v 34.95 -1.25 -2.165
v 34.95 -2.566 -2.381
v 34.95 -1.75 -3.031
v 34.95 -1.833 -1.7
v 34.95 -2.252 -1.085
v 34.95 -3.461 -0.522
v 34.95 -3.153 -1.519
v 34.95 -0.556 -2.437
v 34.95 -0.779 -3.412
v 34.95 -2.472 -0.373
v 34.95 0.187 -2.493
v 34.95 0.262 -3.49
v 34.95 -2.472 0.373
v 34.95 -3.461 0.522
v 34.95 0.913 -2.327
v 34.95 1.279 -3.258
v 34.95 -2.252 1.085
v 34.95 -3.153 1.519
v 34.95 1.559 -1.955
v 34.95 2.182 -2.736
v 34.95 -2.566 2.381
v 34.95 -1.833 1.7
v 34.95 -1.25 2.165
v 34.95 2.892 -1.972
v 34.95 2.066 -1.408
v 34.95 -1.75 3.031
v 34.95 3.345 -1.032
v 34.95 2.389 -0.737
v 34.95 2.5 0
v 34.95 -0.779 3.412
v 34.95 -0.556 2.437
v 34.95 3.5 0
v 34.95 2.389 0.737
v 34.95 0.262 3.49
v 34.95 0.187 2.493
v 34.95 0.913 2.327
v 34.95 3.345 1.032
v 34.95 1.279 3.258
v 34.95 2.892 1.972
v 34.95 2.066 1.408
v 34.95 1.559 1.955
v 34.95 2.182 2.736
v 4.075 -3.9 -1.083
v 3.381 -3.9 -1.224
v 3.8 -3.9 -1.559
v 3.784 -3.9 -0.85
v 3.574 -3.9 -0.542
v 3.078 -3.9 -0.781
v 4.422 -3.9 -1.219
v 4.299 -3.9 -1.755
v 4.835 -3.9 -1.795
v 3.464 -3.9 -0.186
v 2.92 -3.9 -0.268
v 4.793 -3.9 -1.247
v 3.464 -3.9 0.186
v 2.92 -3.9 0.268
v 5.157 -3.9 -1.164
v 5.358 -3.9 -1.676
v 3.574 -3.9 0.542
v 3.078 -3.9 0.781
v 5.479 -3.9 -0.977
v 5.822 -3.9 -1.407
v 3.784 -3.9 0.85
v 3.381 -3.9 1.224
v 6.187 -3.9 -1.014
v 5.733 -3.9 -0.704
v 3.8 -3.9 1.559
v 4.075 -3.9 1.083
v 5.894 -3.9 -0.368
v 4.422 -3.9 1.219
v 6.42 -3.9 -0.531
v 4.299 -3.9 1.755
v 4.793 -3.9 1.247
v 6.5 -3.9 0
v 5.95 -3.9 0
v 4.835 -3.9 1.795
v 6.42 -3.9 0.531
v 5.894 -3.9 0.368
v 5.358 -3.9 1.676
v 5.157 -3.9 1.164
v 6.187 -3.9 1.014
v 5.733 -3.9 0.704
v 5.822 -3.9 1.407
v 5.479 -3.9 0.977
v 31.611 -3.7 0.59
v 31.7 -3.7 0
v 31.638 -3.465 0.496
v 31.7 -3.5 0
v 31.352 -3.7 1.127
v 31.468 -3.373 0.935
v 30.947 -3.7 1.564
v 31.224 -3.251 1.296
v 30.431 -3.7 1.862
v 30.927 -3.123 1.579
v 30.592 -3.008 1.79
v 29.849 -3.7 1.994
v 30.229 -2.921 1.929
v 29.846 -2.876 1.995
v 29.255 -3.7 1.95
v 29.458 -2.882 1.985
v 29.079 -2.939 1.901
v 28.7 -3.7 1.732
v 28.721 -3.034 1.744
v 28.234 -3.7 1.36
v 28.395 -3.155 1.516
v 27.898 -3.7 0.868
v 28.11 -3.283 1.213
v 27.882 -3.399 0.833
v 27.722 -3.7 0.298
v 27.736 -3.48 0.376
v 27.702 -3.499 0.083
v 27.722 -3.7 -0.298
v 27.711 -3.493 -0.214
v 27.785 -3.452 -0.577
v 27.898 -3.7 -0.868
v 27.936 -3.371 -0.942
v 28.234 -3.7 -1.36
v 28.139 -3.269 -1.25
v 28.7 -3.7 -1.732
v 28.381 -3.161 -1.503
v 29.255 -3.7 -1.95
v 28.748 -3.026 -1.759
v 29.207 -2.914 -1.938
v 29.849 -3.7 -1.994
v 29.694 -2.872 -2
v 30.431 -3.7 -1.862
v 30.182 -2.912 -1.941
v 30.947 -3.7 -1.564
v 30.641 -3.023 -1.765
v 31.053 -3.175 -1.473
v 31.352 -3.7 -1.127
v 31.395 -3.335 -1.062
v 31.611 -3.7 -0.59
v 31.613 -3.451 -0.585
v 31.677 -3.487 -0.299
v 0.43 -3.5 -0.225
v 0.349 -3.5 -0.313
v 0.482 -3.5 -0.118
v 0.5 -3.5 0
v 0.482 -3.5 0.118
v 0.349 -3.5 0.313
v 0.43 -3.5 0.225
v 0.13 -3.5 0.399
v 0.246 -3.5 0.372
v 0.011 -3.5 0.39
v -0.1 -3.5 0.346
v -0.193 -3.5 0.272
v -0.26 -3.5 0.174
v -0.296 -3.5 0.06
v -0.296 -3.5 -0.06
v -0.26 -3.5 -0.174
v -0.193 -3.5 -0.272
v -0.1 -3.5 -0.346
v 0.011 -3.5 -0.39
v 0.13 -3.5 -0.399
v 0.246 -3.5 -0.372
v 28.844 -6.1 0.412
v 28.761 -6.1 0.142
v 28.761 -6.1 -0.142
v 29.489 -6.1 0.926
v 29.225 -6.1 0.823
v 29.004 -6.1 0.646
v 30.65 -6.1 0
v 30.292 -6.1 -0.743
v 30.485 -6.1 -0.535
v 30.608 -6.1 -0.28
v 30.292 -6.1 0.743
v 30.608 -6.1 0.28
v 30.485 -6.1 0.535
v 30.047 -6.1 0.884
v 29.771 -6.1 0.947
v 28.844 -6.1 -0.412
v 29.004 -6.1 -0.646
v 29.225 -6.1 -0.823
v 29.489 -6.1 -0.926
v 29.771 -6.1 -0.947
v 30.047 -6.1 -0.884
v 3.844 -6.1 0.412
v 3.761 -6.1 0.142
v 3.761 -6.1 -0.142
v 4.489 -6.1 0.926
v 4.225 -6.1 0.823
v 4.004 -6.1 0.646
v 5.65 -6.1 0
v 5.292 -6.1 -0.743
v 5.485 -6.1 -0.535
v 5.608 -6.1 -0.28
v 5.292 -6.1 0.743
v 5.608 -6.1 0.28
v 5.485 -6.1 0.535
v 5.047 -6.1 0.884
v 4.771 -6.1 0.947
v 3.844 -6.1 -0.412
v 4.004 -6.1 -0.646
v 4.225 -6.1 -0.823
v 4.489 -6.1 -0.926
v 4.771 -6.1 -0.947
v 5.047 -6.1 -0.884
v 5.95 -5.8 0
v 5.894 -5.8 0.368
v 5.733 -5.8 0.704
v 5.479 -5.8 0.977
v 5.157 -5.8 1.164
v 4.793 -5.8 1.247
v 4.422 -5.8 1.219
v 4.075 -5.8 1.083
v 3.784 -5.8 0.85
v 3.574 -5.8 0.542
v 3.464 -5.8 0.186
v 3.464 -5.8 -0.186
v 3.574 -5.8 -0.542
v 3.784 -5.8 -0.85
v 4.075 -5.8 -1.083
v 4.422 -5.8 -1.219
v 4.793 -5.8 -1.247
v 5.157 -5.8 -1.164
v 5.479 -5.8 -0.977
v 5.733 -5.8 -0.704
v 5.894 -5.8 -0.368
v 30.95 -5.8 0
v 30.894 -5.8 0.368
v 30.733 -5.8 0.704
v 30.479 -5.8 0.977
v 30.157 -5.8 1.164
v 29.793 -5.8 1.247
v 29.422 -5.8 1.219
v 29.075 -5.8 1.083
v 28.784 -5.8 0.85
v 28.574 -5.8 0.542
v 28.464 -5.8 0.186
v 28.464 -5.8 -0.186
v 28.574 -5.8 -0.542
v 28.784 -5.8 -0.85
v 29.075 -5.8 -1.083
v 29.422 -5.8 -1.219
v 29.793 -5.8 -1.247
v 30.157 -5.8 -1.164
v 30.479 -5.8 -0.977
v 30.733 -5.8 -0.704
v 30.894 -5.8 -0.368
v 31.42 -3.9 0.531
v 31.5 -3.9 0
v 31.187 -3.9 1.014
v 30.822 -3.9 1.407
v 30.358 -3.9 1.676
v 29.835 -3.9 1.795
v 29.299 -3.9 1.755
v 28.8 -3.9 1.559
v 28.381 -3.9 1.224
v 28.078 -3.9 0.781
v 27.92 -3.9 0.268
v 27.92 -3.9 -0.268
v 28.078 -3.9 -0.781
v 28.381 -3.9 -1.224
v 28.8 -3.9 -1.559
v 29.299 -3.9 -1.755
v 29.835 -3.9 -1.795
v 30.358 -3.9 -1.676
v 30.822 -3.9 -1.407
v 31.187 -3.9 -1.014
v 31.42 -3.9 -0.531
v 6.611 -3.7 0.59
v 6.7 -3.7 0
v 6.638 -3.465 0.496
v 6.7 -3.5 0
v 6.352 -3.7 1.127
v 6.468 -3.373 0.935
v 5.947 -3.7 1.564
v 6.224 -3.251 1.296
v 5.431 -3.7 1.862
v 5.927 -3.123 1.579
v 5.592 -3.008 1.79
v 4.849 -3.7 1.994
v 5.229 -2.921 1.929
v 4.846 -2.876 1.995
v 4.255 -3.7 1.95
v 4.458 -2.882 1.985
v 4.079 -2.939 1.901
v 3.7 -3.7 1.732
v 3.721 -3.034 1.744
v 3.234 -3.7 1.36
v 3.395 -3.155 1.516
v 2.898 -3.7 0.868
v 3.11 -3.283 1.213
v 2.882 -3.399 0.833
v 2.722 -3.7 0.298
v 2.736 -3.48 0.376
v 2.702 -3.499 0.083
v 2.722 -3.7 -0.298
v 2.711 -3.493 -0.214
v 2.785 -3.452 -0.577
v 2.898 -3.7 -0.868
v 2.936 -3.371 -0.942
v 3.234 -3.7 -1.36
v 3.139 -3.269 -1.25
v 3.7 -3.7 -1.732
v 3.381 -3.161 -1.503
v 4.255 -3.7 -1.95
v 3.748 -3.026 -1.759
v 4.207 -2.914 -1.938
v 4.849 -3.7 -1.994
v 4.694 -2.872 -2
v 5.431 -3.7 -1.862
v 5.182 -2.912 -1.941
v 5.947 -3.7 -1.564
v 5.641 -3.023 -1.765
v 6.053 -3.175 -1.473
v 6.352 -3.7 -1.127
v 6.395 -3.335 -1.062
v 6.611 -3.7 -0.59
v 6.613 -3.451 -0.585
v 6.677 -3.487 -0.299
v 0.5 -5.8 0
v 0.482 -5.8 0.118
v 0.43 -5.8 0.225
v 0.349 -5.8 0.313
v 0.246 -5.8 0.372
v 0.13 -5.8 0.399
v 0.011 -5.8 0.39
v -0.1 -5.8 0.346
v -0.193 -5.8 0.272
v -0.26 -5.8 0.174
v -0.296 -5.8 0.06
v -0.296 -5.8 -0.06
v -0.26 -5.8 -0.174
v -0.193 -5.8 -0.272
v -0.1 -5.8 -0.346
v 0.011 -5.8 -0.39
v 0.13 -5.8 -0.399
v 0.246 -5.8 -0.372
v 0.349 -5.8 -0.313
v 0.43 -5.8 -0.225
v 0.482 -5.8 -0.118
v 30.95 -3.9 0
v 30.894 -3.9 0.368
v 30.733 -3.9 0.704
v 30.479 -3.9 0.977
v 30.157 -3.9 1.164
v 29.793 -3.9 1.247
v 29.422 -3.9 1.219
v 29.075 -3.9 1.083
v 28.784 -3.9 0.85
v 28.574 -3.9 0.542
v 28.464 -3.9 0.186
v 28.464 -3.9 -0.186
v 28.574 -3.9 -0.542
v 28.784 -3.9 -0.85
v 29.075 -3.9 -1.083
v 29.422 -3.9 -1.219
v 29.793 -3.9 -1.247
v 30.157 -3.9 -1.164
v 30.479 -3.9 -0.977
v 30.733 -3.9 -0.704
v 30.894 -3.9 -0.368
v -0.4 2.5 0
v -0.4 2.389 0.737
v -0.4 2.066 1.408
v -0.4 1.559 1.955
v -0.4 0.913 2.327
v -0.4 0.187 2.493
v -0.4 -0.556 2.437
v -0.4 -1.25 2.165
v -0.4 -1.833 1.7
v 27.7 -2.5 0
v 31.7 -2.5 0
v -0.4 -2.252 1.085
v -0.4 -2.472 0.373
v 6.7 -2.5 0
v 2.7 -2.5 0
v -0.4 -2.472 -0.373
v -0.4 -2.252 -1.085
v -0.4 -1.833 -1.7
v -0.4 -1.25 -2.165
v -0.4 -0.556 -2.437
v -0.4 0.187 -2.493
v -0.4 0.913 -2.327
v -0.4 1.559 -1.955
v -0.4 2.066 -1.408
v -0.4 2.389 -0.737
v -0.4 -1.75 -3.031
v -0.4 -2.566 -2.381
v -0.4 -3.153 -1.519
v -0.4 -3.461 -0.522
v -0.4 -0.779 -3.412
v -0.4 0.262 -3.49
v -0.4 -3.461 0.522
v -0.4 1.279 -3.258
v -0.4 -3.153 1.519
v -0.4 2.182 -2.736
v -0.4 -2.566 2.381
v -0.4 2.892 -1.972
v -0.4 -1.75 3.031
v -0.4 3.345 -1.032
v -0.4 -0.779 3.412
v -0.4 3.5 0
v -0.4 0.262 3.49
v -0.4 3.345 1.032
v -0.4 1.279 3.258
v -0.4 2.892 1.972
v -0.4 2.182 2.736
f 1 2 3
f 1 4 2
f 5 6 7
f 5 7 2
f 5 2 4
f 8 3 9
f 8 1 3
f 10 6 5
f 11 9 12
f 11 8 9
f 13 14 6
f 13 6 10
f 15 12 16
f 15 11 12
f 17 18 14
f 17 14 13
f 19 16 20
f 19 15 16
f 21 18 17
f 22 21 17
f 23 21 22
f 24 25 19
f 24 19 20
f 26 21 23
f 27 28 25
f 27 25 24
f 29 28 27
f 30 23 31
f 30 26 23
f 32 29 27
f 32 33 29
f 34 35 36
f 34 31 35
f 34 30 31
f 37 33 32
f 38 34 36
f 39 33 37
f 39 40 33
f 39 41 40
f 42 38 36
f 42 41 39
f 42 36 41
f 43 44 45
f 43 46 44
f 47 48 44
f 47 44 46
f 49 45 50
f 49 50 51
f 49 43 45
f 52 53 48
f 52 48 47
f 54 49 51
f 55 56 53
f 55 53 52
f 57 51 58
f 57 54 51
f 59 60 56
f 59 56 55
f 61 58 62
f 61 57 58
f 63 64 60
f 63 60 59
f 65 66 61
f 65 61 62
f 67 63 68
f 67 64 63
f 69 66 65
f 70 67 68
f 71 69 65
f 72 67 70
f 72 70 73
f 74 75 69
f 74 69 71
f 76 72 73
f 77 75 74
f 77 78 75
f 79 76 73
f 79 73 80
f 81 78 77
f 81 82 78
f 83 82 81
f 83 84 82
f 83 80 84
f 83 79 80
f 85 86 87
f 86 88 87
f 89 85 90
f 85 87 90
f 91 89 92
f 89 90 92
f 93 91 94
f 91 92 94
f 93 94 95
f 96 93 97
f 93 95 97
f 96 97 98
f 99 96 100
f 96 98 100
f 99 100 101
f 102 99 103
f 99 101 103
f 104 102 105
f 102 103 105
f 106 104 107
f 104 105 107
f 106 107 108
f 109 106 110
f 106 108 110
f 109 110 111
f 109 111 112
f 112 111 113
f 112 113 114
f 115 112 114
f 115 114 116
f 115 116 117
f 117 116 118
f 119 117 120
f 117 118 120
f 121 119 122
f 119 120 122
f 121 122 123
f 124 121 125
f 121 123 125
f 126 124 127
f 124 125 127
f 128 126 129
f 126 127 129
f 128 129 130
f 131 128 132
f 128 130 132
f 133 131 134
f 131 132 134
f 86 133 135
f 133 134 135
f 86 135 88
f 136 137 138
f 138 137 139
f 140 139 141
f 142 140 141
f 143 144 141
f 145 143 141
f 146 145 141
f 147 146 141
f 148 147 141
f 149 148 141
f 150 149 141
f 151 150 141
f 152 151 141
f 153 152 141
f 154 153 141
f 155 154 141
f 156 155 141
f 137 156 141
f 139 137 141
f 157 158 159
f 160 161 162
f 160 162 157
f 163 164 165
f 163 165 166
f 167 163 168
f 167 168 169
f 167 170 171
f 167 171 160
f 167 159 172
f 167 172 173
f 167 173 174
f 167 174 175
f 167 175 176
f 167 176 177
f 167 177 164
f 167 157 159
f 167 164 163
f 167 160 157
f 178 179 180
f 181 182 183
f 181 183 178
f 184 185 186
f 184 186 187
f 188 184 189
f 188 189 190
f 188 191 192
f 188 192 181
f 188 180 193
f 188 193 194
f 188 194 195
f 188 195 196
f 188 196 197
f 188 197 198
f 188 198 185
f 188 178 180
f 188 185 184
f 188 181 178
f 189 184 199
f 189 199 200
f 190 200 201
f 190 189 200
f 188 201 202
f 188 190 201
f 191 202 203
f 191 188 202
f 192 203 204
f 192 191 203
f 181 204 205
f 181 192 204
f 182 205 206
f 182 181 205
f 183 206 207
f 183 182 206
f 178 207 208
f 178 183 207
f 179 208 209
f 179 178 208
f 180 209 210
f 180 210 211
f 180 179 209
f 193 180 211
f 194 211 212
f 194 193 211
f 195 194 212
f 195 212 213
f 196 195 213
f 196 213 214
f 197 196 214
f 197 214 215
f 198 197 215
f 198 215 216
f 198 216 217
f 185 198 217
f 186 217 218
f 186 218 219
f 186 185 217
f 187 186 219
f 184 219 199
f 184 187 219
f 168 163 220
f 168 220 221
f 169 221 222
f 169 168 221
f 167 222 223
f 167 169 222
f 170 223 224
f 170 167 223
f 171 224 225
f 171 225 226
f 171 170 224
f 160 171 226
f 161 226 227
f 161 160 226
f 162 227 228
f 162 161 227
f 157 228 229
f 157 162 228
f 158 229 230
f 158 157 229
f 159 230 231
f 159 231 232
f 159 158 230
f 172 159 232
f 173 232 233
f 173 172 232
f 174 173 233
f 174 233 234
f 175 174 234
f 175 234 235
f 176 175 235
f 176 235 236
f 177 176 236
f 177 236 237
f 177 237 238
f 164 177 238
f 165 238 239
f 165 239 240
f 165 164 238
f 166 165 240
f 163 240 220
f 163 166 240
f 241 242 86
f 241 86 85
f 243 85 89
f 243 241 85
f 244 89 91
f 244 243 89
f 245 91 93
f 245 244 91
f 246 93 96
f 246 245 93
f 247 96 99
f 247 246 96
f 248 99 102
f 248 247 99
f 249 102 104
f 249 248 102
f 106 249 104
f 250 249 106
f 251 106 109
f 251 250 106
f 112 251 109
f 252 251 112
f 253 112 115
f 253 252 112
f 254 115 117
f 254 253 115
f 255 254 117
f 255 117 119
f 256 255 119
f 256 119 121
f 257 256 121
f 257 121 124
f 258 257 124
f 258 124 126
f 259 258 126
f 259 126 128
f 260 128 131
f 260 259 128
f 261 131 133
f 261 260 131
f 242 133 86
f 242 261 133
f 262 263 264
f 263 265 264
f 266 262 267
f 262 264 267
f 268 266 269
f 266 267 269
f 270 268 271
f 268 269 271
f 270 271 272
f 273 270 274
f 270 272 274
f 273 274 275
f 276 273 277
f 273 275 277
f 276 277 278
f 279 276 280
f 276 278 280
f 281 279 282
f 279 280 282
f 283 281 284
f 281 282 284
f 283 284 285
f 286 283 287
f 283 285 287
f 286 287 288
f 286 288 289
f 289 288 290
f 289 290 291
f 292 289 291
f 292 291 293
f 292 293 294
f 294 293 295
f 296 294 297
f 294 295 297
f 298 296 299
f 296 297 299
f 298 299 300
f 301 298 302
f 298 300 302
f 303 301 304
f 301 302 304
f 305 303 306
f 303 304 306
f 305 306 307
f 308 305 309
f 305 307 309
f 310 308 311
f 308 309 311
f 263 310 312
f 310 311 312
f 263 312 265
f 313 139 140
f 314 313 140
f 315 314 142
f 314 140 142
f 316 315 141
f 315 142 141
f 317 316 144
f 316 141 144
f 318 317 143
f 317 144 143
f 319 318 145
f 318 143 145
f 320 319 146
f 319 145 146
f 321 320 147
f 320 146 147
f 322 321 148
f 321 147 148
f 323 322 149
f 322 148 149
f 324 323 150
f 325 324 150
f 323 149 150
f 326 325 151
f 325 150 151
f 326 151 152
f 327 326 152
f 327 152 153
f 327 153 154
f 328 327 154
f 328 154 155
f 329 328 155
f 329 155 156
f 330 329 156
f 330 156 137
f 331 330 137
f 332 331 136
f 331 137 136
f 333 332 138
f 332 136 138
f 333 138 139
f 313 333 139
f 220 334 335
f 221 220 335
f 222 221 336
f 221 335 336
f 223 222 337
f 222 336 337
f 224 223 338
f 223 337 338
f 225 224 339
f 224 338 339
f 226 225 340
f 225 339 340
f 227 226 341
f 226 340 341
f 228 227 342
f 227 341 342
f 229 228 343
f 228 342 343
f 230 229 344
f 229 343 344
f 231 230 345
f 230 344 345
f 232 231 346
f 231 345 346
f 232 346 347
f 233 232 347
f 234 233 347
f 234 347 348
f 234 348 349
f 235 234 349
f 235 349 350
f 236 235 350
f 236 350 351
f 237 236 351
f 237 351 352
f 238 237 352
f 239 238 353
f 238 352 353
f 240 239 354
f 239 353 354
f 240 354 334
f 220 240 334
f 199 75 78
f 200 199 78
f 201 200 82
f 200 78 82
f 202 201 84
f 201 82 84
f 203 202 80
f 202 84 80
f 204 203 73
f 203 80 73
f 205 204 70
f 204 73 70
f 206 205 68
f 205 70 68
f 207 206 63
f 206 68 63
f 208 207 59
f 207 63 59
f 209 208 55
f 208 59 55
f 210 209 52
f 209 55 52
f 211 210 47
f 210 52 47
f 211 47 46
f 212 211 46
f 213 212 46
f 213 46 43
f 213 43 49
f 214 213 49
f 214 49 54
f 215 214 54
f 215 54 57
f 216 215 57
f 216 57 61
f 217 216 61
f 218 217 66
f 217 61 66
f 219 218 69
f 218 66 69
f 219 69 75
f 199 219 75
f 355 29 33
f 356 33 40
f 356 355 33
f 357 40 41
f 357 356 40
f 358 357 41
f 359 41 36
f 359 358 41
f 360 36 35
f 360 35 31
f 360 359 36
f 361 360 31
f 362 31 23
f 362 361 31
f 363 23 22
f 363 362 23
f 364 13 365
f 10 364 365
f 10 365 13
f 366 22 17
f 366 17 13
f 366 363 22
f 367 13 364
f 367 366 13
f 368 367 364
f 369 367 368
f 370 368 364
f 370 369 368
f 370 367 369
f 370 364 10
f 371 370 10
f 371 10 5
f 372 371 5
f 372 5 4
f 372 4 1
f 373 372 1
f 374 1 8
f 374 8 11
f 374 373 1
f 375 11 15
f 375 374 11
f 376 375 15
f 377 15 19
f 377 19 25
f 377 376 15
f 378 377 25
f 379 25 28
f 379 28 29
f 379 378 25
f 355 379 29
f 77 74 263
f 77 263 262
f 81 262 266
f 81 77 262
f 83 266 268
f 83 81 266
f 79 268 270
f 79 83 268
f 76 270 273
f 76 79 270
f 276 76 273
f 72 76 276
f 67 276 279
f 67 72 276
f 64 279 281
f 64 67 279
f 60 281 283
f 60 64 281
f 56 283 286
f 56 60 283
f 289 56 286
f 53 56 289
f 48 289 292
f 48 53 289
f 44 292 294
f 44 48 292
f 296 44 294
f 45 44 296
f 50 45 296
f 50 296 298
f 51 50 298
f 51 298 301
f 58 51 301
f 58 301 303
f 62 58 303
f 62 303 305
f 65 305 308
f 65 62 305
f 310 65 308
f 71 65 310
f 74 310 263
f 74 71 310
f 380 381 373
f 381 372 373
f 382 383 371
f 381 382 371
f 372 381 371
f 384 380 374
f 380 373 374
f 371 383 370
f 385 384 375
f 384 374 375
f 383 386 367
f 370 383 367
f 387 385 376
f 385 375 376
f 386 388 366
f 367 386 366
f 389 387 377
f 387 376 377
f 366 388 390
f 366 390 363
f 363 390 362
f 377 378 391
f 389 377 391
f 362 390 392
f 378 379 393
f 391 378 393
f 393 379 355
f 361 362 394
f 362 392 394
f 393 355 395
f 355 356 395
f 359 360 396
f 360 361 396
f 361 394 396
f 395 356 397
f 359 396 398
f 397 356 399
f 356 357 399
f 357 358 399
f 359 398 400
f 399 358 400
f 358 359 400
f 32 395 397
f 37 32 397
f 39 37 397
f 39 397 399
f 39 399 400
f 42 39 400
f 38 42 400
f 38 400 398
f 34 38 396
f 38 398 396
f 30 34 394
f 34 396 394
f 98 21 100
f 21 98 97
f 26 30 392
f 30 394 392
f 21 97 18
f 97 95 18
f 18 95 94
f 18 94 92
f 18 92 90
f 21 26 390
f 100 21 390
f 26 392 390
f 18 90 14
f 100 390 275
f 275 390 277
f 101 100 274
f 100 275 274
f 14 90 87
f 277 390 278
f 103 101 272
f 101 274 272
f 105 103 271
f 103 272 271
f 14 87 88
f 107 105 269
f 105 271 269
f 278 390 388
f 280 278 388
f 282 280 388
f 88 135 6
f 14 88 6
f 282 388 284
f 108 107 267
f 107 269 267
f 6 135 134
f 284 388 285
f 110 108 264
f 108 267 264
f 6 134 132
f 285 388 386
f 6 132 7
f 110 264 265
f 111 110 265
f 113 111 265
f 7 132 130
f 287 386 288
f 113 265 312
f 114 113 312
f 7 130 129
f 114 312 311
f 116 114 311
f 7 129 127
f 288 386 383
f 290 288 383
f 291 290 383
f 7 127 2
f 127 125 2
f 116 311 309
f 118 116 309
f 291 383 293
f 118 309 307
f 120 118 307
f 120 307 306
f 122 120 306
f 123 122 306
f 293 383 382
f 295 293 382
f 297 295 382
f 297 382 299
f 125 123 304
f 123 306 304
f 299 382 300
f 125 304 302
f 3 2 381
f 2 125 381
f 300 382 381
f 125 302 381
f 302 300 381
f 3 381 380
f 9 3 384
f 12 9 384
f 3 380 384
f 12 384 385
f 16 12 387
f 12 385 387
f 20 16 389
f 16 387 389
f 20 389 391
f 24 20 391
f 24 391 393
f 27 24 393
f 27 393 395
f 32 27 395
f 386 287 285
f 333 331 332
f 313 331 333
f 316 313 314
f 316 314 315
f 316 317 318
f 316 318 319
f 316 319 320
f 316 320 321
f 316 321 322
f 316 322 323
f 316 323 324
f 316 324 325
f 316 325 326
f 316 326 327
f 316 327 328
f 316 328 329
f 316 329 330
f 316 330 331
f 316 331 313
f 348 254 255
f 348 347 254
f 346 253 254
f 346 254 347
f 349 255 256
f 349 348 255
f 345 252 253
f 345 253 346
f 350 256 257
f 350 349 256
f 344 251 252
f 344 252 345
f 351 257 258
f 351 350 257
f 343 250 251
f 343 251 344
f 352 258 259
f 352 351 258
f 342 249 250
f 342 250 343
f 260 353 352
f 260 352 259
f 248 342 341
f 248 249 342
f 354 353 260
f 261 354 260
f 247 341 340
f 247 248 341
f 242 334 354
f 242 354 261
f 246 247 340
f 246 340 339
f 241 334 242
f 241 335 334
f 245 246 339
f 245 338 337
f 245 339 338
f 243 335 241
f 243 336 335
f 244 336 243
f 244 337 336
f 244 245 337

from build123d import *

# Parameters (mm, degrees)
F0_R           = 3.5
F0_R_2         = 2.5
F1_DEPTH       = 34.55
F6_DEPTH       = 0.4
F7_DEPTH       = 0.4
F9_R           = 2
F10_DEPTH      = 0.4
F10_DEPTH_BACK = 1
F11_R          = 1.25
F12_DEPTH      = 2.2
F13_SIZE       = 0.2
F14_SIZE       = 0.3
F5_R           = 0.4
F15_DEPTH      = 2.3


with BuildPart() as f1:
    # F0 (on Right) → F1 (new body)
    with BuildSketch(Plane.YZ):
        Circle(F0_R)
        Circle(F0_R_2, mode=Mode.SUBTRACT)
    extrude(amount=F1_DEPTH)

    # F6 (add): a face of the model
    f6_faces = [f1.faces().sort_by_distance(p)[0] for p in [
        (0, -3.4010050506, 0),
    ]]
    extrude(f6_faces, amount=F6_DEPTH)

    # F7 (add): a face of the model
    f7_faces = [f1.faces().sort_by_distance(p)[0] for p in [
        (34.55, -3.4010050506, 0),
    ]]
    extrude(f7_faces, amount=F7_DEPTH)

    # F9 (on plane+point) → F10 (join, two sides)
    with BuildSketch(Plane.XZ.offset(3.5)) as f10_sk:
        with Locations((4.7, 0)):
            Circle(F9_R)
        with Locations((29.7, 0)):
            Circle(F9_R)
    extrude(amount=F10_DEPTH)
    extrude(f10_sk.sketch, amount=-F10_DEPTH_BACK)

    # F11 (on face) → F12 (join)
    with BuildSketch(Plane.XZ.offset(3.9)):
        with Locations((4.7, 0)):
            Circle(F11_R)
        with Locations((29.7, 0)):
            Circle(F11_R)
    extrude(amount=F12_DEPTH)

    # F13
    f13_edges = [f1.edges().sort_by_distance(p)[0] for p in [
        (2.7, -3.9, 0),
        (27.7, -3.9, 0),
    ]]
    chamfer(f13_edges, length=F13_SIZE)

    # F14
    f14_edges = [f1.edges().sort_by_distance(p)[0] for p in [
        (3.45, -6.1, 0),
        (28.45, -6.1, 0),
    ]]
    chamfer(f14_edges, length=F14_SIZE)


with BuildPart() as f15:
    # F5 (on plane+point) → F15 (new body)
    with BuildSketch(Plane.XZ.offset(3.5)):
        with Locations((0.1, 0)):
            Circle(F5_R)
    extrude(amount=F15_DEPTH)


solid = Compound([f1.part, f15.part])
